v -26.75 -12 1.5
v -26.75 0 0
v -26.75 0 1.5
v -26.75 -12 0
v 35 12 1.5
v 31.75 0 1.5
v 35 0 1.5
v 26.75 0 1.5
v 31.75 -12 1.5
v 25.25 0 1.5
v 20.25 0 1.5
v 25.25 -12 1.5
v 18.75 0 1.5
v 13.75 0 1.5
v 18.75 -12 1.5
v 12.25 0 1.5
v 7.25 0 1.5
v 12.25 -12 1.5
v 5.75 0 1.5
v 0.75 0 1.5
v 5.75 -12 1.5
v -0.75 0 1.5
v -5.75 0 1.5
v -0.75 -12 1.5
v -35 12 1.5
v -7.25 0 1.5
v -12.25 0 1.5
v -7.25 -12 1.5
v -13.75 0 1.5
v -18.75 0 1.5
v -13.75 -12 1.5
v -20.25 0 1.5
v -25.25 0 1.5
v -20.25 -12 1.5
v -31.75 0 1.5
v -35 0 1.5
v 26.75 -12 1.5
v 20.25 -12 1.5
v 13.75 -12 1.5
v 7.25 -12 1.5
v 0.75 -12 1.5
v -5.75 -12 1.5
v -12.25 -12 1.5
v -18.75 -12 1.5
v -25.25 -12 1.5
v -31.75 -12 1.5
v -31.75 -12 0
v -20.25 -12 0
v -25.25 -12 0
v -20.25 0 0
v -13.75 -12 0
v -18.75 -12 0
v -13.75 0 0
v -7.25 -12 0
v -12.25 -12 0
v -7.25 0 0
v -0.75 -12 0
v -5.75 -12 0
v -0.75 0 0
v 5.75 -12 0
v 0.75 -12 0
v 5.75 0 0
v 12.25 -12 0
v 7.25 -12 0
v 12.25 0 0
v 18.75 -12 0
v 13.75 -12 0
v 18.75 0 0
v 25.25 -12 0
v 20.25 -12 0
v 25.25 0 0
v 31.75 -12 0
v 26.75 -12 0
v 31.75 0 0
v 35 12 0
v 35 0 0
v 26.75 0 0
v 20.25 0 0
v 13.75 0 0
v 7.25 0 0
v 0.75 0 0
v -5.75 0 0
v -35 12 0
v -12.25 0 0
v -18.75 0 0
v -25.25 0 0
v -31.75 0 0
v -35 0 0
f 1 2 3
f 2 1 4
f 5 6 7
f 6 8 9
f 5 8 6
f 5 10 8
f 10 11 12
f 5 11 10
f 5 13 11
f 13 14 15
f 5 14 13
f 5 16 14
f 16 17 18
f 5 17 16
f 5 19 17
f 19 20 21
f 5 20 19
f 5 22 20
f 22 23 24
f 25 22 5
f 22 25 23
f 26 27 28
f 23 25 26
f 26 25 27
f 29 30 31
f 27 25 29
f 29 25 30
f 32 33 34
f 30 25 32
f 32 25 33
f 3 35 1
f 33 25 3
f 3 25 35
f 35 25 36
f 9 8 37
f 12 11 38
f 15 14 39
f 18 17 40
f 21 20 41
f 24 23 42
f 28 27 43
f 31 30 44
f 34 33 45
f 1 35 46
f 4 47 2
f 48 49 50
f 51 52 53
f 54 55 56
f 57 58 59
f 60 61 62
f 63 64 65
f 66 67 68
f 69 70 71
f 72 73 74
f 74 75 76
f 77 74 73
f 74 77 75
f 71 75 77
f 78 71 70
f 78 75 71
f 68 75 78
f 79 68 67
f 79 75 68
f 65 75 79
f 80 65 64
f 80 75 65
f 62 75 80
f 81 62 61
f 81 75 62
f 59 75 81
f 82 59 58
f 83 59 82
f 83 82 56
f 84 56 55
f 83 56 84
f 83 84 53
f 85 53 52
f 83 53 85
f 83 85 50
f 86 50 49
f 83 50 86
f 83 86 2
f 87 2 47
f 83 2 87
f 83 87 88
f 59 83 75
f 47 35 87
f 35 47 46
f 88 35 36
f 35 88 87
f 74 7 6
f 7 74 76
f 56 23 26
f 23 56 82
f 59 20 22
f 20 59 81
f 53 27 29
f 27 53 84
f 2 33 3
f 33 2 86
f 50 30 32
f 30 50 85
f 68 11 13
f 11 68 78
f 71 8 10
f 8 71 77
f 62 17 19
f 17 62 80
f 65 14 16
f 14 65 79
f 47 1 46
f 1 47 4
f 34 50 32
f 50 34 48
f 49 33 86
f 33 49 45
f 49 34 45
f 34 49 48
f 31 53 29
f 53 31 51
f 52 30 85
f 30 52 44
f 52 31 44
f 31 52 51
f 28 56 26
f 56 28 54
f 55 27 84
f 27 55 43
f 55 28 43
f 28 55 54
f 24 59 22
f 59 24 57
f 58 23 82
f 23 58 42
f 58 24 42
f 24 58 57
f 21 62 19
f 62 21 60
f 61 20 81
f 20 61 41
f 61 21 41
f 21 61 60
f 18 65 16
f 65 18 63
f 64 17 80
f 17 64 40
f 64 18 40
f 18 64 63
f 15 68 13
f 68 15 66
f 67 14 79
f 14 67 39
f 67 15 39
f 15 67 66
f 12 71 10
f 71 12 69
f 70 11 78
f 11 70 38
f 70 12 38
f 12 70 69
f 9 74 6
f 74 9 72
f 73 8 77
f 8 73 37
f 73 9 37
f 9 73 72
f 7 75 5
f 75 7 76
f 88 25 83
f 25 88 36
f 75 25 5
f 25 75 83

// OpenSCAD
// 10-well agarose gel comb - printed lying flat
// Units: mm

plate_t     = 1.5;   // plate thickness (Z)
spine_len   = 70;    // spine length (X)
spine_w     = 12;    // spine width (Y)
tooth_count = 10;    // number of teeth
tooth_w     = 5.0;   // tooth width (X)
tooth_len   = 12;    // tooth length (Y)
gap         = 1.5;   // gap between teeth (X)

pitch = tooth_w + gap;          // centre-to-centre spacing
x0    = -(tooth_count - 1) * pitch / 2;  // first tooth centre (row centred)

union() {
    // Spine
    translate([-spine_len / 2, 0, 0])
        cube([spine_len, spine_w, plate_t]);

    // Teeth hanging in -Y
    for (i = [0 : tooth_count - 1])
        translate([x0 + i * pitch - tooth_w / 2,
                   -tooth_len, 0])
            cube([tooth_w, tooth_len, plate_t]);
}
